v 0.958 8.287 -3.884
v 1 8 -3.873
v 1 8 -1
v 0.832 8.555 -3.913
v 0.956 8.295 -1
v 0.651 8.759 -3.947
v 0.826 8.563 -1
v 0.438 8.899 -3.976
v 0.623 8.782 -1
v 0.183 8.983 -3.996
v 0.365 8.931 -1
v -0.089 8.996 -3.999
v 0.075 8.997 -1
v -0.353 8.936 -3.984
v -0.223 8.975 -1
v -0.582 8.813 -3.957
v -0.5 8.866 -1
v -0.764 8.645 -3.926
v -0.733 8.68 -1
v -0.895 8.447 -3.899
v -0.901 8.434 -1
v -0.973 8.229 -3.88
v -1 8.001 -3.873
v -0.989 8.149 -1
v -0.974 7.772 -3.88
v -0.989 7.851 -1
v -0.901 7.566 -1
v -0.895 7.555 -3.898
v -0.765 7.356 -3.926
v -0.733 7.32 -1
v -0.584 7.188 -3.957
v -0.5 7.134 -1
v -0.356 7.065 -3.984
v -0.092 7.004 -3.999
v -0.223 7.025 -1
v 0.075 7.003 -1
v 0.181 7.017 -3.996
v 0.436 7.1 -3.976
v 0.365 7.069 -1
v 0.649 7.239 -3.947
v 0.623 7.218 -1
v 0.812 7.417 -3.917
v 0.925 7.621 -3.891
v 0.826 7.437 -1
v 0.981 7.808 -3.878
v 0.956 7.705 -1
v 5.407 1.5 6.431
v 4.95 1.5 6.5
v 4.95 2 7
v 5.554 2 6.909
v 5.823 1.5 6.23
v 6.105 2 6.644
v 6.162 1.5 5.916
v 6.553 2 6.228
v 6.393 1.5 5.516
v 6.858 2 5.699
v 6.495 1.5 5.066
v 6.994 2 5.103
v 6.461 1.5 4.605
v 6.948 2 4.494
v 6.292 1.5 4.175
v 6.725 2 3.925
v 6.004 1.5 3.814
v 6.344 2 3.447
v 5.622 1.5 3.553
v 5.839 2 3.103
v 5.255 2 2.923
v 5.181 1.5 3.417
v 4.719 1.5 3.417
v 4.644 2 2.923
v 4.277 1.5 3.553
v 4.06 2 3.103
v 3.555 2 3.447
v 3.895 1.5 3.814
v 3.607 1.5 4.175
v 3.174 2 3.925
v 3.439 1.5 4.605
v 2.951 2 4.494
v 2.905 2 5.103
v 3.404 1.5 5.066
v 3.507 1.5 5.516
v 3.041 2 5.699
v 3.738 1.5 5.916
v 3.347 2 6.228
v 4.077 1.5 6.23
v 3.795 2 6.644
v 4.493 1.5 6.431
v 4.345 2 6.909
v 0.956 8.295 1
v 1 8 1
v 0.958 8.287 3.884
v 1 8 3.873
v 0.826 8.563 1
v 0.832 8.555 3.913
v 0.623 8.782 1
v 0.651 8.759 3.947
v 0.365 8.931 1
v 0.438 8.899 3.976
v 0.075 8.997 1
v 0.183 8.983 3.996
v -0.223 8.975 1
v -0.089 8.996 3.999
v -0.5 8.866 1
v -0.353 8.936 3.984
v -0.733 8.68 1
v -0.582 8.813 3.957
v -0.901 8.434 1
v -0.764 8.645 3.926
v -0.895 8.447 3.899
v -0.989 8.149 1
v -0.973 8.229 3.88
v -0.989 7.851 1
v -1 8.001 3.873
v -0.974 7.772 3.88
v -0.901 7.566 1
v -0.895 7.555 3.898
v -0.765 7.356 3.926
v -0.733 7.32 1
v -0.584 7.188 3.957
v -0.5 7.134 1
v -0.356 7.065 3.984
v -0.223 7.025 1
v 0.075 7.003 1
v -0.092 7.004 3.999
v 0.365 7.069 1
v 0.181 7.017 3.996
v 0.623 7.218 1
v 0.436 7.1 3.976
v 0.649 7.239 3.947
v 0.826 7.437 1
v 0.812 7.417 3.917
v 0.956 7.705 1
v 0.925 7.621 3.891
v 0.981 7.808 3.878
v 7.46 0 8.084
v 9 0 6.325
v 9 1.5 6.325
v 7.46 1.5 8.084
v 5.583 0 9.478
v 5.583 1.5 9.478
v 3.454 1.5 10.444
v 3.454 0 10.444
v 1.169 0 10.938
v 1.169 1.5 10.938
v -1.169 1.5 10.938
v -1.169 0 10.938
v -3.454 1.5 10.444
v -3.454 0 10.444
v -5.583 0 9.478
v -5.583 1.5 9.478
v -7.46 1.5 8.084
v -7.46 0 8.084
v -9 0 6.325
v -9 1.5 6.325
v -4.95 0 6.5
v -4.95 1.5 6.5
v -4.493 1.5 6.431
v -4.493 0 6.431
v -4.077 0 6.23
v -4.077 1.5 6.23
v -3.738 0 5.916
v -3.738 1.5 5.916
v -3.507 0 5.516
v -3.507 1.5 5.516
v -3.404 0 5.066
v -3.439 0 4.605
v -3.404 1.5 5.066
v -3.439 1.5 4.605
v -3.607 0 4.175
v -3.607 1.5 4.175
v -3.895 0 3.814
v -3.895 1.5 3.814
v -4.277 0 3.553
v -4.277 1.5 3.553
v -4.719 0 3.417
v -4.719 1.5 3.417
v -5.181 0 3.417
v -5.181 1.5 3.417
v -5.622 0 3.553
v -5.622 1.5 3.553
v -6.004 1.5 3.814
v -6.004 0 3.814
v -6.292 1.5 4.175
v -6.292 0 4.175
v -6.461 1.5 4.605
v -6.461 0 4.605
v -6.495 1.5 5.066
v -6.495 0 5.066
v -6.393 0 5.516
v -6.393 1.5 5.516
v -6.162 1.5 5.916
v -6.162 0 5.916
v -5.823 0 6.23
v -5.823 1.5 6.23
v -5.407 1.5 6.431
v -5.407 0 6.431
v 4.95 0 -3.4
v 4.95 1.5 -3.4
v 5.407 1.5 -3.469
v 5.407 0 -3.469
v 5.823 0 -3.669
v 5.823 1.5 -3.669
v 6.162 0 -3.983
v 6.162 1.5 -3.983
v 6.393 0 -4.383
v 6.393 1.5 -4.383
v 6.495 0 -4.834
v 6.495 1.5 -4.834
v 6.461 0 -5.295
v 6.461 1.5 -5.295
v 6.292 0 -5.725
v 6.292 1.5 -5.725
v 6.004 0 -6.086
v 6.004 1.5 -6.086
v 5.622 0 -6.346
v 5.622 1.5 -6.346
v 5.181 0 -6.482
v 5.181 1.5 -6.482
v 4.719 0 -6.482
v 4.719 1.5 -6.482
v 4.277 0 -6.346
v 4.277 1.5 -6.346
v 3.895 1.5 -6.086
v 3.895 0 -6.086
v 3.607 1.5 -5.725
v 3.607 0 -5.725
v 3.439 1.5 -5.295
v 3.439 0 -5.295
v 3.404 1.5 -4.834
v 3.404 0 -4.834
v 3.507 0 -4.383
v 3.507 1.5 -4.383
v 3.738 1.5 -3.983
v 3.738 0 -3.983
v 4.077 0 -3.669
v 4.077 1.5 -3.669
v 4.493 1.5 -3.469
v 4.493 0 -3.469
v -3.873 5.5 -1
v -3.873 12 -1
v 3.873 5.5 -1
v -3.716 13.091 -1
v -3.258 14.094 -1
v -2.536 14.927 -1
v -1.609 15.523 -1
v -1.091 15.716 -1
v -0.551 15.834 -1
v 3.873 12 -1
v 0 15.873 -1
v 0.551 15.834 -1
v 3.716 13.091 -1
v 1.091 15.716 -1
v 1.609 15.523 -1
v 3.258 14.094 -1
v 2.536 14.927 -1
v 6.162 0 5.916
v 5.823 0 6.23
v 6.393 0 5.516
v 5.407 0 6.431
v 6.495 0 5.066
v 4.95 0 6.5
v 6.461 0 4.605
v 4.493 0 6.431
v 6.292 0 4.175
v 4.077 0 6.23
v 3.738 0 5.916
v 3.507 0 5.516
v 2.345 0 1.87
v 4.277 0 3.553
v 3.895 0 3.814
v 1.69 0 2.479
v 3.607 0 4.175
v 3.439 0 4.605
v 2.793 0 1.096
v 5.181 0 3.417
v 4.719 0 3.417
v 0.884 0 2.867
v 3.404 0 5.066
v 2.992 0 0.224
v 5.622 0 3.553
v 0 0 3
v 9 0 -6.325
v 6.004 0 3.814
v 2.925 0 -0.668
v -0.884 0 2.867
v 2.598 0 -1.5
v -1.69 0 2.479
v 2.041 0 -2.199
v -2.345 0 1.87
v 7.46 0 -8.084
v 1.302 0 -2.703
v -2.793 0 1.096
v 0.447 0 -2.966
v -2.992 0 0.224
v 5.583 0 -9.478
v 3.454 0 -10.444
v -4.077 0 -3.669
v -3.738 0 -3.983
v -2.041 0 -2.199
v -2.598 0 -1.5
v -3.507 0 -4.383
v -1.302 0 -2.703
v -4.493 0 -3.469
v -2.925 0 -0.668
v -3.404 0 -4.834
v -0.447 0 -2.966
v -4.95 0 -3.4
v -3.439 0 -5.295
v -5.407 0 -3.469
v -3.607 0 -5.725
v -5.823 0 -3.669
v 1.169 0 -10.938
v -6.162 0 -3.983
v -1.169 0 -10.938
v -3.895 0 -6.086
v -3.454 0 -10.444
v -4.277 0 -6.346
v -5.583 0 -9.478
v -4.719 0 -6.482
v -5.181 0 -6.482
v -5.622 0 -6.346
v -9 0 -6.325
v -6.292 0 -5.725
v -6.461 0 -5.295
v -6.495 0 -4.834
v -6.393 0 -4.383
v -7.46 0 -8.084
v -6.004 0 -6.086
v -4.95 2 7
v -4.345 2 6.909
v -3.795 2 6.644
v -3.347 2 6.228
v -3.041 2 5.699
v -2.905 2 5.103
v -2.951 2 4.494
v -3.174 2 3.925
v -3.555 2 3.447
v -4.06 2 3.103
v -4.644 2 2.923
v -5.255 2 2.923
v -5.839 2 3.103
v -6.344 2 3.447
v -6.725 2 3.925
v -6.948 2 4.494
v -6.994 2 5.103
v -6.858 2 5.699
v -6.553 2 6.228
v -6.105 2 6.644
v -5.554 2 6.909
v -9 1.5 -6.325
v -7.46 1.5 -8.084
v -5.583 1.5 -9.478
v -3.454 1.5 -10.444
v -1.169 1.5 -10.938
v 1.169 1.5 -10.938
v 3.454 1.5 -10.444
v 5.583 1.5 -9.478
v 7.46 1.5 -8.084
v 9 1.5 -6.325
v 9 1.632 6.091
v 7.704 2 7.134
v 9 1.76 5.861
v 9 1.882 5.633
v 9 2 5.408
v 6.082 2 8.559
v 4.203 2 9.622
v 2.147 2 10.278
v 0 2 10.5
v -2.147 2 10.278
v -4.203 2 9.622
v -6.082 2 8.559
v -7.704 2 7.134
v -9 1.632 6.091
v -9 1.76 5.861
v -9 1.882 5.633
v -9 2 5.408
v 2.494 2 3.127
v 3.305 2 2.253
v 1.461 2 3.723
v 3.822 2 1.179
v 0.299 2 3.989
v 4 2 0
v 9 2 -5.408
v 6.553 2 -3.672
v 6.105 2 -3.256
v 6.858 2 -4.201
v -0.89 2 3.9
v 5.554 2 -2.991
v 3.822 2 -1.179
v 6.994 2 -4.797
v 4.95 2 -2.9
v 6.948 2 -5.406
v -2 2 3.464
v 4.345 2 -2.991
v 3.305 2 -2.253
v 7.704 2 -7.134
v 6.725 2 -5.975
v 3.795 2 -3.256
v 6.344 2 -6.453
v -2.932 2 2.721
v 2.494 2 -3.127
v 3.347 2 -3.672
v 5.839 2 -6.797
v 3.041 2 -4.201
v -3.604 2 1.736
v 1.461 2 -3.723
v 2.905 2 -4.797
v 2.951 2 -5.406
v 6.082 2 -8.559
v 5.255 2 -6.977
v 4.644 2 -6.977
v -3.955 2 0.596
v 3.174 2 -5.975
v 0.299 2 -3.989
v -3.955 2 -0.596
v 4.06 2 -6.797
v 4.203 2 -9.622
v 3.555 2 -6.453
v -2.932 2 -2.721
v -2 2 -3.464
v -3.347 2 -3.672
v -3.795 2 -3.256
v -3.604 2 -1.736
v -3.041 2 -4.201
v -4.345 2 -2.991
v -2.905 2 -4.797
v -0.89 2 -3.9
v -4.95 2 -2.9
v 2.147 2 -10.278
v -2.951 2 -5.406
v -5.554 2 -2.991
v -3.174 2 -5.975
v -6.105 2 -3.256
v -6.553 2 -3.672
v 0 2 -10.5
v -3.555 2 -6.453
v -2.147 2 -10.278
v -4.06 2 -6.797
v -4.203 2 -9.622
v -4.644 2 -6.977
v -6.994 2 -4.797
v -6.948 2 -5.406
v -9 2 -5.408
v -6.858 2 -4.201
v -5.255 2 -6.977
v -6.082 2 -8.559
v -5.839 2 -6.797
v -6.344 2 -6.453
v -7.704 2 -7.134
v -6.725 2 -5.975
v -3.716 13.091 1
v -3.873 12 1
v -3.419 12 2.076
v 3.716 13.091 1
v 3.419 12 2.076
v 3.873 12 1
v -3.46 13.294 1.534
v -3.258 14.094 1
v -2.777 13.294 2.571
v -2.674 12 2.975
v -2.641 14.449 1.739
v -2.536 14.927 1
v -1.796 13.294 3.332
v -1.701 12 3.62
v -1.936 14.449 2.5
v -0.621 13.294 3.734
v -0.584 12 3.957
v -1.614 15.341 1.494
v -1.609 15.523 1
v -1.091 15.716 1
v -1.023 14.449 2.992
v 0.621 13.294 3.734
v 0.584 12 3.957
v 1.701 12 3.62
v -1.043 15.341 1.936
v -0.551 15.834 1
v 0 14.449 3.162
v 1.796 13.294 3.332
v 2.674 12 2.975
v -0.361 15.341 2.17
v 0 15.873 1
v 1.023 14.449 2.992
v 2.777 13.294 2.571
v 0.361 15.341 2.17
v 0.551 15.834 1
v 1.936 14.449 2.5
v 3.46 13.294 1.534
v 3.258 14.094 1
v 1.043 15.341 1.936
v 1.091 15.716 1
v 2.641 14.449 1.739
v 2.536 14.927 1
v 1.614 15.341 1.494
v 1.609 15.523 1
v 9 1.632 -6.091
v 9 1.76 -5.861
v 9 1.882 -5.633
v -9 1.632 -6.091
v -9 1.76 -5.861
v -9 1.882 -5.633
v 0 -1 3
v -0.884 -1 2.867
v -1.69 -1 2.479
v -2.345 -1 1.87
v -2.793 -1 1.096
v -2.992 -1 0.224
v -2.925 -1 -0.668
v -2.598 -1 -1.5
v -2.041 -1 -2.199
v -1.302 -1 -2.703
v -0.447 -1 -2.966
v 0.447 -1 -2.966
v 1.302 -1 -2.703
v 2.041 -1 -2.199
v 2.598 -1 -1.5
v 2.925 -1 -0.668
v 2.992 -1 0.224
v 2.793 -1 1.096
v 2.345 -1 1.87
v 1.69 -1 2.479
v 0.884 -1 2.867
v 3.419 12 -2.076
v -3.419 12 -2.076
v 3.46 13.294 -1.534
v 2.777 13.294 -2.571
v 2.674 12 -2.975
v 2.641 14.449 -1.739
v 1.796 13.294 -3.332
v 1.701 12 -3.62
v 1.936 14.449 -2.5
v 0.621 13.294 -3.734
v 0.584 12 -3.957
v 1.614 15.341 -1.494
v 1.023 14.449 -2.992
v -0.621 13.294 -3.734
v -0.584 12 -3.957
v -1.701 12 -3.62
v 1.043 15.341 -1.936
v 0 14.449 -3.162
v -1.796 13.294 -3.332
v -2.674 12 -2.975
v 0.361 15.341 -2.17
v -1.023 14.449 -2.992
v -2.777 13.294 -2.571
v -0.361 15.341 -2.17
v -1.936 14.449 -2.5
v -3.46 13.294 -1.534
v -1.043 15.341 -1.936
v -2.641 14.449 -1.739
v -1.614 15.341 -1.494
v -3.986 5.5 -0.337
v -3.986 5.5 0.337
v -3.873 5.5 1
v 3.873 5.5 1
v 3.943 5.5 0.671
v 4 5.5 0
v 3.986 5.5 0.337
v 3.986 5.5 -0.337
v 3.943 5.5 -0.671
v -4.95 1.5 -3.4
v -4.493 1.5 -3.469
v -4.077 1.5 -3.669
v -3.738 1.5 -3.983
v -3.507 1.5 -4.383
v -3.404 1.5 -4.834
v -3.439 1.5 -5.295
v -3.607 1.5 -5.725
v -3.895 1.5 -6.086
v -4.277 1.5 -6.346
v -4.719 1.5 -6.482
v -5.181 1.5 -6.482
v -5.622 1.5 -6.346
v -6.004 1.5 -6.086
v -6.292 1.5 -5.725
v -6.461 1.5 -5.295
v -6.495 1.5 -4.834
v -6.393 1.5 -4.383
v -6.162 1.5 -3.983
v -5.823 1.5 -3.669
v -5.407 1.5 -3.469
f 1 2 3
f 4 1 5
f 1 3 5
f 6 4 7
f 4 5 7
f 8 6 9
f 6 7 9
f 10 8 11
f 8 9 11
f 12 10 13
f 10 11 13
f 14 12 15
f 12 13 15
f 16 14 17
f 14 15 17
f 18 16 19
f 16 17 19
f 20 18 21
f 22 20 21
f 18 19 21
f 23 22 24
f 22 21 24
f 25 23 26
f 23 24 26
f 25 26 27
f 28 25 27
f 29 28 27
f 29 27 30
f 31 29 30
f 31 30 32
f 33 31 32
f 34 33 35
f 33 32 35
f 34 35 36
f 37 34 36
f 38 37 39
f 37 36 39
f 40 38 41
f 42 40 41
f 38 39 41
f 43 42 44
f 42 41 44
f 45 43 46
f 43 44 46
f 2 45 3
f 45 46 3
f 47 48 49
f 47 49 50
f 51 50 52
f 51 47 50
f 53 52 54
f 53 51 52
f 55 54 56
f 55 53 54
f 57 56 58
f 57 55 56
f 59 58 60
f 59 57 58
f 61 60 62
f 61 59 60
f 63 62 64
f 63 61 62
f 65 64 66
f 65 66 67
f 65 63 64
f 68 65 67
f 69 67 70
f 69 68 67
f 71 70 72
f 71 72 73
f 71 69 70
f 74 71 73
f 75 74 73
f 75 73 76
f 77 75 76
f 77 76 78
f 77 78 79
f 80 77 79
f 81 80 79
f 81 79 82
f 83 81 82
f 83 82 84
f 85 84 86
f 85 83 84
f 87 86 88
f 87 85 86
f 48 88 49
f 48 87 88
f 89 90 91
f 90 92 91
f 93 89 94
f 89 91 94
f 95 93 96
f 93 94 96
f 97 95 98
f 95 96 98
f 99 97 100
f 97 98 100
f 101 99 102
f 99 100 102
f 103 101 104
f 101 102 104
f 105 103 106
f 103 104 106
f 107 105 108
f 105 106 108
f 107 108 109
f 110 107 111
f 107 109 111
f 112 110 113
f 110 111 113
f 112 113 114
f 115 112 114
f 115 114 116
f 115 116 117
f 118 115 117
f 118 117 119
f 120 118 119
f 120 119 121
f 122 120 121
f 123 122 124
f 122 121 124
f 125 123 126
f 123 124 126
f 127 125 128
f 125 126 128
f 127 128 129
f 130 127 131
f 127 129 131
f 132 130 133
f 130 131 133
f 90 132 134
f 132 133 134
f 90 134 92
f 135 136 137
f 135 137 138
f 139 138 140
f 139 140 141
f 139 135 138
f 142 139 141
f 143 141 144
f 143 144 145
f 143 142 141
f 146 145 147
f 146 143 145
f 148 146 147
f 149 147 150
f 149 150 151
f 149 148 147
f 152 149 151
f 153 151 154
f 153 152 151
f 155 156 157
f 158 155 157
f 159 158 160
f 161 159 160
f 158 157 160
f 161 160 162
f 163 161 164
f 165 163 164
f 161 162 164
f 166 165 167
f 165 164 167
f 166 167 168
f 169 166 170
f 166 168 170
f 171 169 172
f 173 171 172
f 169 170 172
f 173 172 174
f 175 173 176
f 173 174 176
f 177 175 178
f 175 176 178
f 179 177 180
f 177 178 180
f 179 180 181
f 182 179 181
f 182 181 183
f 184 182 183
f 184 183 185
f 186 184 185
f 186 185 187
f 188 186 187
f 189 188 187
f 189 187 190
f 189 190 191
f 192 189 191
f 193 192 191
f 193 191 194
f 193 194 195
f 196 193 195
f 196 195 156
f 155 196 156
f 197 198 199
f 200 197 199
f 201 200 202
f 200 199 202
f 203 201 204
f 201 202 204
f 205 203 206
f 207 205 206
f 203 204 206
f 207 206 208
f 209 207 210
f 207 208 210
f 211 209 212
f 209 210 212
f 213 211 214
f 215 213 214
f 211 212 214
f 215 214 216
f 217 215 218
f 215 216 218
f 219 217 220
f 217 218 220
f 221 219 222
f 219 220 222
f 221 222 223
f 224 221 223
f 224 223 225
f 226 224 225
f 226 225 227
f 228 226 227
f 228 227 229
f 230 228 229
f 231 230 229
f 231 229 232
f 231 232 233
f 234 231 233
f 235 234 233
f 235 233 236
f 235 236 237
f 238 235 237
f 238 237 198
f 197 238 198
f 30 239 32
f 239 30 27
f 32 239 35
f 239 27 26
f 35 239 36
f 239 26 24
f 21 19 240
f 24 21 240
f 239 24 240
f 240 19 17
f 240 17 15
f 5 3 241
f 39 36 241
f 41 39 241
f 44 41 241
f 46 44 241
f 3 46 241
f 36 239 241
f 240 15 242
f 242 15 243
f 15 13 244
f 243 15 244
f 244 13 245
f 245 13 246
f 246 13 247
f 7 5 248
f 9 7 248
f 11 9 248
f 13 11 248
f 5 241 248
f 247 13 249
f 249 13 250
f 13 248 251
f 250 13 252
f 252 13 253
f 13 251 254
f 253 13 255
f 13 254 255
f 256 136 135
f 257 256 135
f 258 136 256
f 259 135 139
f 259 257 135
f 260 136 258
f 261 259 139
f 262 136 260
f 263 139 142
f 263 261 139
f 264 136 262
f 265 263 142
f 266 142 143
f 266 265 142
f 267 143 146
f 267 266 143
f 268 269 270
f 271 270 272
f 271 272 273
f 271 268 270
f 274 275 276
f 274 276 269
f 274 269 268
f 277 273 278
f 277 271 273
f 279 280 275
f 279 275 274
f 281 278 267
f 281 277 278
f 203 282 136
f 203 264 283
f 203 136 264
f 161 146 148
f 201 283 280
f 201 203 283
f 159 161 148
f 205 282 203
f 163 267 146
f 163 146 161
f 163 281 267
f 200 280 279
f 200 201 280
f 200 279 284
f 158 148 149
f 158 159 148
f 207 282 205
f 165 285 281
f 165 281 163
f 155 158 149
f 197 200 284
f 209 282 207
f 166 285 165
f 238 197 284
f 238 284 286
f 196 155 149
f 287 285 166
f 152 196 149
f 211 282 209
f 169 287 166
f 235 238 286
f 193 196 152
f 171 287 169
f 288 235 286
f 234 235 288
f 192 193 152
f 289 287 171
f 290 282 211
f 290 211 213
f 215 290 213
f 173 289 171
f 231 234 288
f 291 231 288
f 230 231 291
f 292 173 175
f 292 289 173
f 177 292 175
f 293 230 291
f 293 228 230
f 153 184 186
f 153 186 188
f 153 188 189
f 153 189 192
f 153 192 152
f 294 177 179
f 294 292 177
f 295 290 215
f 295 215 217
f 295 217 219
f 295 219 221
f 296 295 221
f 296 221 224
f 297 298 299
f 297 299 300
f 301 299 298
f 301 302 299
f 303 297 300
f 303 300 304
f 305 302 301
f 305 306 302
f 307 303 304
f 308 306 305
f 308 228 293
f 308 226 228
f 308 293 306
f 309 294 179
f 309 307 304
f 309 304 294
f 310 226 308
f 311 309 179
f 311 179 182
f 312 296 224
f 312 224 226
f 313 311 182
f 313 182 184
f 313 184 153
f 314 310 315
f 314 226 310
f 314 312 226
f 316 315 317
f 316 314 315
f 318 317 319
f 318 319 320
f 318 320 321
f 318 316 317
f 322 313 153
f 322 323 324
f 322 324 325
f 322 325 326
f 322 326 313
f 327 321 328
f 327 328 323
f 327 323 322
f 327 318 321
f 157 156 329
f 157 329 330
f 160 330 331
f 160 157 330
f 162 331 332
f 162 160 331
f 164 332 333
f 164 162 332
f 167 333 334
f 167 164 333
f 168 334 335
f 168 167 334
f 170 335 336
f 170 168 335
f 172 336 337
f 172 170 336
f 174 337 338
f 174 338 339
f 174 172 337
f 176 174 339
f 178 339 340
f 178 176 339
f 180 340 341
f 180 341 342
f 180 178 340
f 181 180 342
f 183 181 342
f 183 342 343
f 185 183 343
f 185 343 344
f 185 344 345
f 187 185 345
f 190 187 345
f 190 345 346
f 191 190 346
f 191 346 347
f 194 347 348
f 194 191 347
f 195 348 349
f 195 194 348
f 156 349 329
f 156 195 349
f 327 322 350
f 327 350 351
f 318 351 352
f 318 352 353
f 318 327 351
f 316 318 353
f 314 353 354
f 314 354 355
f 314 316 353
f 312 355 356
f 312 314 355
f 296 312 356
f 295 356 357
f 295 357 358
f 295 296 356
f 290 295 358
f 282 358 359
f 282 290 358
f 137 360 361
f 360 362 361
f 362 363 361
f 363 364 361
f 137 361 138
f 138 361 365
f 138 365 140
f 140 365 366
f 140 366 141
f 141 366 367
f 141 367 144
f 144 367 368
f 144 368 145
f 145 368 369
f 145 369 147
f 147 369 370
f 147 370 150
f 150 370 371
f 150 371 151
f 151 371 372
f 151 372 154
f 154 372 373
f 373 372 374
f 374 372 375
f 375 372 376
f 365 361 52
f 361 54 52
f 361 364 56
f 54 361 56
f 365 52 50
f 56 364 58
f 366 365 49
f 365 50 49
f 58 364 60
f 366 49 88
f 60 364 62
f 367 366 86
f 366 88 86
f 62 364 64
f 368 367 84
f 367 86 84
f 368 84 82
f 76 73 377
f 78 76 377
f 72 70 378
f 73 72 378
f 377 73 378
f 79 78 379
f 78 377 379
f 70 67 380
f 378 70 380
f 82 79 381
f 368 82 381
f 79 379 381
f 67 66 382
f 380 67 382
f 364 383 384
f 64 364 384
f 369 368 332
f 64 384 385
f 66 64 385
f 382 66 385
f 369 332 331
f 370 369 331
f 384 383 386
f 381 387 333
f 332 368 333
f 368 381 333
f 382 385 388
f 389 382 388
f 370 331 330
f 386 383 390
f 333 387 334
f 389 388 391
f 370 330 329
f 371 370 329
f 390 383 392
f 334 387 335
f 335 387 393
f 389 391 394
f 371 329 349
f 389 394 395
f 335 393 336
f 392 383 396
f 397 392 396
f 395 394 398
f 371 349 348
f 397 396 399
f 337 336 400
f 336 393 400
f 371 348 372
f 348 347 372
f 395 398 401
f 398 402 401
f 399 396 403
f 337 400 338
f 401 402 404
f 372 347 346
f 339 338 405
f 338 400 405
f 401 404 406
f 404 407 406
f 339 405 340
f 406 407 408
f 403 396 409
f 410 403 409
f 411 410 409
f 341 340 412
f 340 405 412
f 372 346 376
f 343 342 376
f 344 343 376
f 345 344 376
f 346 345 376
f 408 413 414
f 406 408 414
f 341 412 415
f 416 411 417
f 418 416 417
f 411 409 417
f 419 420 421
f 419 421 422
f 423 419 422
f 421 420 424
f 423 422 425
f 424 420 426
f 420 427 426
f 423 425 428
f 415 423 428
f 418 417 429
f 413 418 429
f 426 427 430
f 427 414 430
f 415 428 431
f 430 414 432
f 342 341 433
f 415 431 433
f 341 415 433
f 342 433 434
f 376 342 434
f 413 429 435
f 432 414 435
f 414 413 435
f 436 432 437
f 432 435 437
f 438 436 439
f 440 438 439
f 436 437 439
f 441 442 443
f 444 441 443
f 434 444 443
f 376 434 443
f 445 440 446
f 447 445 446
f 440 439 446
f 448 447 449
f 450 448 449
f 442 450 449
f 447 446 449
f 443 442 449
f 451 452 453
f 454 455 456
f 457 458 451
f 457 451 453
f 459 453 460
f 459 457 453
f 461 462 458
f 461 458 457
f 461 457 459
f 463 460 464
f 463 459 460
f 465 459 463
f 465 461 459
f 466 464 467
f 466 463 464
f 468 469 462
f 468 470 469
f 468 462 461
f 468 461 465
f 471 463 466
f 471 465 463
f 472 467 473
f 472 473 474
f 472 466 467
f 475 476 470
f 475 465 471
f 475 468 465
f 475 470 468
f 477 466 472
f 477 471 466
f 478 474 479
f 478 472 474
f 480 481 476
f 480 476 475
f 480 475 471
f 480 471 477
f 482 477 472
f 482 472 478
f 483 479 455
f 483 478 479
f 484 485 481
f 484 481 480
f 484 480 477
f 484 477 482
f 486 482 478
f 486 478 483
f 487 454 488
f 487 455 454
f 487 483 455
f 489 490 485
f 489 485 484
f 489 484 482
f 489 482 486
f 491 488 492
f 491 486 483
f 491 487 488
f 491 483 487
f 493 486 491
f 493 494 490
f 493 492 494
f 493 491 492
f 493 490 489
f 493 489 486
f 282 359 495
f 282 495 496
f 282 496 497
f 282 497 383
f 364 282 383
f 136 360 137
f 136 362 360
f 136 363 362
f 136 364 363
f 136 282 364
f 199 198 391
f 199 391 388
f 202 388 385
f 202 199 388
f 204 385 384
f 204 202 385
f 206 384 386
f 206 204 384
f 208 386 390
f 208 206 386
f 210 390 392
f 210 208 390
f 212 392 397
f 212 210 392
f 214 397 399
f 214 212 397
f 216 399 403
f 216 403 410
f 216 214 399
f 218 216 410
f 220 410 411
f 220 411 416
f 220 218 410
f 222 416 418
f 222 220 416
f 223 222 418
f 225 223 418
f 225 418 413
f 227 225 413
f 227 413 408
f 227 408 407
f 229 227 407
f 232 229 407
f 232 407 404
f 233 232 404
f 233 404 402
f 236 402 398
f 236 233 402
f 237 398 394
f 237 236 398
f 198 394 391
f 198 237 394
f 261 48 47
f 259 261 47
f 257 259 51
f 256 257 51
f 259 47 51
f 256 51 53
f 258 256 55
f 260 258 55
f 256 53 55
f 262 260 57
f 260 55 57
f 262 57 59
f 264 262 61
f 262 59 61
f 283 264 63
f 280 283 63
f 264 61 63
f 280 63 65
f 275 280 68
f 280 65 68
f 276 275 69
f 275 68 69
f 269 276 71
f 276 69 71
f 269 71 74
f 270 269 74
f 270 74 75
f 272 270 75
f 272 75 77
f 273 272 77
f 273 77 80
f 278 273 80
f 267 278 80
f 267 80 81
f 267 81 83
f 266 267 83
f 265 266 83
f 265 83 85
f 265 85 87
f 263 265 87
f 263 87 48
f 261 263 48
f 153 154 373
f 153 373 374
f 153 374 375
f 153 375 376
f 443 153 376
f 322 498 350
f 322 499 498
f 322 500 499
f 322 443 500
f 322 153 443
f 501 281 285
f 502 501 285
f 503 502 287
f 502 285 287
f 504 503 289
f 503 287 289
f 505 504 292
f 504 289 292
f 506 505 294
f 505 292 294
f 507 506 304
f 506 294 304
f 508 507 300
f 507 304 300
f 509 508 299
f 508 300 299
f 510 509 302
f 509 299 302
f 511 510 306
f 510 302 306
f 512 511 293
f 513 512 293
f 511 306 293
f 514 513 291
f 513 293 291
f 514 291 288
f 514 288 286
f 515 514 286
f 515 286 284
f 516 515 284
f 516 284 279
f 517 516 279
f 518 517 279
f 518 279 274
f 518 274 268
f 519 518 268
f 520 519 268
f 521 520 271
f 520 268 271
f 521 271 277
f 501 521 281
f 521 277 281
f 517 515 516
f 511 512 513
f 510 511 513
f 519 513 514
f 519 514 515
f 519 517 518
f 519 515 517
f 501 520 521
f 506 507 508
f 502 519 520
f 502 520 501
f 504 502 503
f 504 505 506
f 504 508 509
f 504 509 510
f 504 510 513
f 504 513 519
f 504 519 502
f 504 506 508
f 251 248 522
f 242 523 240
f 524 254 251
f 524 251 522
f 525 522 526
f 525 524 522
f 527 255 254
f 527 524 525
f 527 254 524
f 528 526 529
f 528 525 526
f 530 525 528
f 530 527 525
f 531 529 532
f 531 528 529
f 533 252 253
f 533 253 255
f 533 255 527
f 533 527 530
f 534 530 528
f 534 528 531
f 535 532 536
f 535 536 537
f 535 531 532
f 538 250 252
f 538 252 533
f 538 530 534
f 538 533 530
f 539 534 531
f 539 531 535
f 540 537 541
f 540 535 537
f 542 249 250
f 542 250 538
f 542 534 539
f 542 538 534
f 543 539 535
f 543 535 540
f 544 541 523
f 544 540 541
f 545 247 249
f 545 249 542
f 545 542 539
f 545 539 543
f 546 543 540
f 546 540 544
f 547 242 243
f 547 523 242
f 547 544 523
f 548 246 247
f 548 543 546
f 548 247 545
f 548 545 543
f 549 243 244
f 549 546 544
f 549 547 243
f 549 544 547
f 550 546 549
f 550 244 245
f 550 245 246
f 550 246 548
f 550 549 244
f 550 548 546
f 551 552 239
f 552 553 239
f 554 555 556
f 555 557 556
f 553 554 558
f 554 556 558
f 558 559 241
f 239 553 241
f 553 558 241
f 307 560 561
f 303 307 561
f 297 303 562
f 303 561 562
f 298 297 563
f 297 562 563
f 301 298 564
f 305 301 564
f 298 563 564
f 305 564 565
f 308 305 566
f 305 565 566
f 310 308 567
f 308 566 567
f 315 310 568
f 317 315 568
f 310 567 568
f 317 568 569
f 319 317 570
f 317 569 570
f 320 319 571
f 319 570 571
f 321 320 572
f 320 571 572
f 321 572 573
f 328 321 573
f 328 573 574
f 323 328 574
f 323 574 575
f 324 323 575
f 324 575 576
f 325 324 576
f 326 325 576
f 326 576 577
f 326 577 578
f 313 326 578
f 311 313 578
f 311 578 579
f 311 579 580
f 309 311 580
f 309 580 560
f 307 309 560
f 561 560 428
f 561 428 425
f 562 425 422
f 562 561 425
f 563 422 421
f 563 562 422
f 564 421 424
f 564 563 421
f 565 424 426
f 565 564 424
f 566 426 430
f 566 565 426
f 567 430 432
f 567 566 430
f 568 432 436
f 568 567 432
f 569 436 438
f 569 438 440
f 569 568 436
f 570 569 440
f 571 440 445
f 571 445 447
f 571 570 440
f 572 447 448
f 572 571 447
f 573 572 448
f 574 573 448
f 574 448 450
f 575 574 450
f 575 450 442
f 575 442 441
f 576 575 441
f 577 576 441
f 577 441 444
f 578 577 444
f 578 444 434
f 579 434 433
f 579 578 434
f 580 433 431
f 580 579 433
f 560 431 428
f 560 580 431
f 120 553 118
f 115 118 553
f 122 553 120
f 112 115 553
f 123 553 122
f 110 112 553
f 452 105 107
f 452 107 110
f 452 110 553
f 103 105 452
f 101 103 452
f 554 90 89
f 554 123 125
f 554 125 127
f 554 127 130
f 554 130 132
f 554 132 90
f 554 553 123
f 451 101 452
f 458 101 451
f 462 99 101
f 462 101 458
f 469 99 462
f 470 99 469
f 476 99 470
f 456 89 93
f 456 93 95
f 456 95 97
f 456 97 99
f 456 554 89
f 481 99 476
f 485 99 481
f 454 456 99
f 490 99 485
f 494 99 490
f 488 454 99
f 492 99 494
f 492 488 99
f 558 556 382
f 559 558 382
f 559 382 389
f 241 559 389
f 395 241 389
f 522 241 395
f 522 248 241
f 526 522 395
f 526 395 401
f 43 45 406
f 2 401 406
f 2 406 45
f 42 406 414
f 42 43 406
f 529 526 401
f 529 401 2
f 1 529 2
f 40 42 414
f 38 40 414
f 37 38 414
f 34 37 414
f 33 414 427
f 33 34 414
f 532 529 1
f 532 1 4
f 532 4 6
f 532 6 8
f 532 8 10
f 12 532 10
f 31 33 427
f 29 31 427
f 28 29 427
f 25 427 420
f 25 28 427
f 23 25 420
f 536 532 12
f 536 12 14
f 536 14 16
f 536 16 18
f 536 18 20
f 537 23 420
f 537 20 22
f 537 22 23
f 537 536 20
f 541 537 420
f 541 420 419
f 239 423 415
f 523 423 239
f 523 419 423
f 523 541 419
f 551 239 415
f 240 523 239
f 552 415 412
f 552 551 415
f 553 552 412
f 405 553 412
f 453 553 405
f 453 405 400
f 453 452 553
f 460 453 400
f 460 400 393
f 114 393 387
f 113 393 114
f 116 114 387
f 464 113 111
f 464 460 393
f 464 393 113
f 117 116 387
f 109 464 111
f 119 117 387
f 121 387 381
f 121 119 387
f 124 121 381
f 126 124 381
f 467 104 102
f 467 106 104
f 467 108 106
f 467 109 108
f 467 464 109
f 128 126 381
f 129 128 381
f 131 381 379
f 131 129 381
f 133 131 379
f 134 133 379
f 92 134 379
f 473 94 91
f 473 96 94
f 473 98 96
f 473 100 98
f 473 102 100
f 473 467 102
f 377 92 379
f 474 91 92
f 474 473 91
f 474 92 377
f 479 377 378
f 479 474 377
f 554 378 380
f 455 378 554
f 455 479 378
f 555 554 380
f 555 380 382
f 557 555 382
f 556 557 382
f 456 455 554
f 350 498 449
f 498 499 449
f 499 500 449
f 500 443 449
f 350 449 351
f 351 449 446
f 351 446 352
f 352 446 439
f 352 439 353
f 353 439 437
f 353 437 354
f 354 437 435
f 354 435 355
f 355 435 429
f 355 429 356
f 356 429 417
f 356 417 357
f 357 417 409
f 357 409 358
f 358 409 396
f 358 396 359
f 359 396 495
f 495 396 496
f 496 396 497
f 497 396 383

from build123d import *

# Parameters (mm, degrees)
BOSS_EXTRUDE1_DEPTH = 2
SKETCH2_R           = 1.55
CUT_EXTRUDE1_DEPTH  = 15.352700094
CHAMFER1_SIZE       = 0.5
SKETCH4_W           = 2
SKETCH4_H           = 14.133755883
CUT_EXTRUDE2_DEPTH  = 6.5
SKETCH5_R           = 1
CUT_EXTRUDE3_DEPTH  = 6.5
SKETCH6_R           = 3
BOSS_EXTRUDE2_DEPTH = 1


with BuildPart() as part:
    # Sketch1 → Boss-Extrude1 (new body)
    with BuildSketch(Plane(origin=(0, 0, 0), x_dir=(1, 0, 0), z_dir=(0, 1, 0))):
        with BuildLine():
            Line((-9, -6.32455532), (-9, 6.32455532))
            ThreePointArc((-9, 6.32455532), (0, 11), (9, 6.32455532))
            Line((9, 6.32455532), (9, -6.32455532))
            ThreePointArc((9, -6.32455532), (0, -11), (-9, -6.32455532))
        make_face()
    extrude(amount=BOSS_EXTRUDE1_DEPTH)

    # Sketch2 → Cut-Extrude1 (cut, through all)
    with BuildSketch(Plane(origin=(0, 2, 0), x_dir=(1, 0, 0), z_dir=(0, 1, 0))):
        with Locations(Location((4.949747468, 4.949747468, 0), (0, 0, 270))):
            Circle(SKETCH2_R)
        with Locations(Location((4.949747468, -4.949747468, 0), (0, 0, 270))):
            Circle(SKETCH2_R)
        with Locations(Location((-4.949747468, -4.949747468, 0), (0, 0, 270))):
            Circle(SKETCH2_R)
        with Locations(Location((-4.949747468, 4.949747468, 0), (0, 0, 270))):
            Circle(SKETCH2_R)
    extrude(amount=-CUT_EXTRUDE1_DEPTH, mode=Mode.SUBTRACT)

    # Chamfer1
    chamfer1_edges = [part.edges().sort_by_distance(p)[0] for p in [
        (0, 2, -11),
        (-4.949747468, 2, -6.499747468),
        (-4.949747468, 2, 3.399747468),
        (4.949747468, 2, 3.399747468),
        (4.949747468, 2, -6.499747468),
        (0, 2, 11),
    ]]
    chamfer(chamfer1_edges, length=CHAMFER1_SIZE)

    # Sketch3 → Revolve1 (revolve)
    with BuildSketch(Plane.XY):
        with BuildLine():
            Line((0, 2), (4, 2))
            Line((4, 2), (4, 12))
            ThreePointArc((4, 12), (2.828427125, 14.828427125), (0, 16))
            Line((0, 16), (0, 2))
        make_face()
    revolve(axis=Axis((0, 2, 0), (0, 1, 0)))

    # Sketch4 → Cut-Extrude2 (cut, symmetric)
    with BuildSketch(Plane(origin=(0, 0, 0), x_dir=(0, 0, -1), z_dir=(1, 0, 0))):
        with Locations((0, 12.566877942)):
            Rectangle(SKETCH4_W, SKETCH4_H)
    extrude(amount=CUT_EXTRUDE2_DEPTH, both=True, mode=Mode.SUBTRACT)

    # Sketch5 → Cut-Extrude3 (cut, symmetric)
    with BuildSketch(Plane.XY):
        with Locations((0, 8)):
            Circle(SKETCH5_R)
    extrude(amount=CUT_EXTRUDE3_DEPTH, both=True, mode=Mode.SUBTRACT)

    # Sketch6 → Boss-Extrude2 (add)
    with BuildSketch(Plane.XZ):
        with Locations(Location((0, 0, 0), (0, 0, 90))):
            Circle(SKETCH6_R)
    extrude(amount=BOSS_EXTRUDE2_DEPTH)


solid = part.part
